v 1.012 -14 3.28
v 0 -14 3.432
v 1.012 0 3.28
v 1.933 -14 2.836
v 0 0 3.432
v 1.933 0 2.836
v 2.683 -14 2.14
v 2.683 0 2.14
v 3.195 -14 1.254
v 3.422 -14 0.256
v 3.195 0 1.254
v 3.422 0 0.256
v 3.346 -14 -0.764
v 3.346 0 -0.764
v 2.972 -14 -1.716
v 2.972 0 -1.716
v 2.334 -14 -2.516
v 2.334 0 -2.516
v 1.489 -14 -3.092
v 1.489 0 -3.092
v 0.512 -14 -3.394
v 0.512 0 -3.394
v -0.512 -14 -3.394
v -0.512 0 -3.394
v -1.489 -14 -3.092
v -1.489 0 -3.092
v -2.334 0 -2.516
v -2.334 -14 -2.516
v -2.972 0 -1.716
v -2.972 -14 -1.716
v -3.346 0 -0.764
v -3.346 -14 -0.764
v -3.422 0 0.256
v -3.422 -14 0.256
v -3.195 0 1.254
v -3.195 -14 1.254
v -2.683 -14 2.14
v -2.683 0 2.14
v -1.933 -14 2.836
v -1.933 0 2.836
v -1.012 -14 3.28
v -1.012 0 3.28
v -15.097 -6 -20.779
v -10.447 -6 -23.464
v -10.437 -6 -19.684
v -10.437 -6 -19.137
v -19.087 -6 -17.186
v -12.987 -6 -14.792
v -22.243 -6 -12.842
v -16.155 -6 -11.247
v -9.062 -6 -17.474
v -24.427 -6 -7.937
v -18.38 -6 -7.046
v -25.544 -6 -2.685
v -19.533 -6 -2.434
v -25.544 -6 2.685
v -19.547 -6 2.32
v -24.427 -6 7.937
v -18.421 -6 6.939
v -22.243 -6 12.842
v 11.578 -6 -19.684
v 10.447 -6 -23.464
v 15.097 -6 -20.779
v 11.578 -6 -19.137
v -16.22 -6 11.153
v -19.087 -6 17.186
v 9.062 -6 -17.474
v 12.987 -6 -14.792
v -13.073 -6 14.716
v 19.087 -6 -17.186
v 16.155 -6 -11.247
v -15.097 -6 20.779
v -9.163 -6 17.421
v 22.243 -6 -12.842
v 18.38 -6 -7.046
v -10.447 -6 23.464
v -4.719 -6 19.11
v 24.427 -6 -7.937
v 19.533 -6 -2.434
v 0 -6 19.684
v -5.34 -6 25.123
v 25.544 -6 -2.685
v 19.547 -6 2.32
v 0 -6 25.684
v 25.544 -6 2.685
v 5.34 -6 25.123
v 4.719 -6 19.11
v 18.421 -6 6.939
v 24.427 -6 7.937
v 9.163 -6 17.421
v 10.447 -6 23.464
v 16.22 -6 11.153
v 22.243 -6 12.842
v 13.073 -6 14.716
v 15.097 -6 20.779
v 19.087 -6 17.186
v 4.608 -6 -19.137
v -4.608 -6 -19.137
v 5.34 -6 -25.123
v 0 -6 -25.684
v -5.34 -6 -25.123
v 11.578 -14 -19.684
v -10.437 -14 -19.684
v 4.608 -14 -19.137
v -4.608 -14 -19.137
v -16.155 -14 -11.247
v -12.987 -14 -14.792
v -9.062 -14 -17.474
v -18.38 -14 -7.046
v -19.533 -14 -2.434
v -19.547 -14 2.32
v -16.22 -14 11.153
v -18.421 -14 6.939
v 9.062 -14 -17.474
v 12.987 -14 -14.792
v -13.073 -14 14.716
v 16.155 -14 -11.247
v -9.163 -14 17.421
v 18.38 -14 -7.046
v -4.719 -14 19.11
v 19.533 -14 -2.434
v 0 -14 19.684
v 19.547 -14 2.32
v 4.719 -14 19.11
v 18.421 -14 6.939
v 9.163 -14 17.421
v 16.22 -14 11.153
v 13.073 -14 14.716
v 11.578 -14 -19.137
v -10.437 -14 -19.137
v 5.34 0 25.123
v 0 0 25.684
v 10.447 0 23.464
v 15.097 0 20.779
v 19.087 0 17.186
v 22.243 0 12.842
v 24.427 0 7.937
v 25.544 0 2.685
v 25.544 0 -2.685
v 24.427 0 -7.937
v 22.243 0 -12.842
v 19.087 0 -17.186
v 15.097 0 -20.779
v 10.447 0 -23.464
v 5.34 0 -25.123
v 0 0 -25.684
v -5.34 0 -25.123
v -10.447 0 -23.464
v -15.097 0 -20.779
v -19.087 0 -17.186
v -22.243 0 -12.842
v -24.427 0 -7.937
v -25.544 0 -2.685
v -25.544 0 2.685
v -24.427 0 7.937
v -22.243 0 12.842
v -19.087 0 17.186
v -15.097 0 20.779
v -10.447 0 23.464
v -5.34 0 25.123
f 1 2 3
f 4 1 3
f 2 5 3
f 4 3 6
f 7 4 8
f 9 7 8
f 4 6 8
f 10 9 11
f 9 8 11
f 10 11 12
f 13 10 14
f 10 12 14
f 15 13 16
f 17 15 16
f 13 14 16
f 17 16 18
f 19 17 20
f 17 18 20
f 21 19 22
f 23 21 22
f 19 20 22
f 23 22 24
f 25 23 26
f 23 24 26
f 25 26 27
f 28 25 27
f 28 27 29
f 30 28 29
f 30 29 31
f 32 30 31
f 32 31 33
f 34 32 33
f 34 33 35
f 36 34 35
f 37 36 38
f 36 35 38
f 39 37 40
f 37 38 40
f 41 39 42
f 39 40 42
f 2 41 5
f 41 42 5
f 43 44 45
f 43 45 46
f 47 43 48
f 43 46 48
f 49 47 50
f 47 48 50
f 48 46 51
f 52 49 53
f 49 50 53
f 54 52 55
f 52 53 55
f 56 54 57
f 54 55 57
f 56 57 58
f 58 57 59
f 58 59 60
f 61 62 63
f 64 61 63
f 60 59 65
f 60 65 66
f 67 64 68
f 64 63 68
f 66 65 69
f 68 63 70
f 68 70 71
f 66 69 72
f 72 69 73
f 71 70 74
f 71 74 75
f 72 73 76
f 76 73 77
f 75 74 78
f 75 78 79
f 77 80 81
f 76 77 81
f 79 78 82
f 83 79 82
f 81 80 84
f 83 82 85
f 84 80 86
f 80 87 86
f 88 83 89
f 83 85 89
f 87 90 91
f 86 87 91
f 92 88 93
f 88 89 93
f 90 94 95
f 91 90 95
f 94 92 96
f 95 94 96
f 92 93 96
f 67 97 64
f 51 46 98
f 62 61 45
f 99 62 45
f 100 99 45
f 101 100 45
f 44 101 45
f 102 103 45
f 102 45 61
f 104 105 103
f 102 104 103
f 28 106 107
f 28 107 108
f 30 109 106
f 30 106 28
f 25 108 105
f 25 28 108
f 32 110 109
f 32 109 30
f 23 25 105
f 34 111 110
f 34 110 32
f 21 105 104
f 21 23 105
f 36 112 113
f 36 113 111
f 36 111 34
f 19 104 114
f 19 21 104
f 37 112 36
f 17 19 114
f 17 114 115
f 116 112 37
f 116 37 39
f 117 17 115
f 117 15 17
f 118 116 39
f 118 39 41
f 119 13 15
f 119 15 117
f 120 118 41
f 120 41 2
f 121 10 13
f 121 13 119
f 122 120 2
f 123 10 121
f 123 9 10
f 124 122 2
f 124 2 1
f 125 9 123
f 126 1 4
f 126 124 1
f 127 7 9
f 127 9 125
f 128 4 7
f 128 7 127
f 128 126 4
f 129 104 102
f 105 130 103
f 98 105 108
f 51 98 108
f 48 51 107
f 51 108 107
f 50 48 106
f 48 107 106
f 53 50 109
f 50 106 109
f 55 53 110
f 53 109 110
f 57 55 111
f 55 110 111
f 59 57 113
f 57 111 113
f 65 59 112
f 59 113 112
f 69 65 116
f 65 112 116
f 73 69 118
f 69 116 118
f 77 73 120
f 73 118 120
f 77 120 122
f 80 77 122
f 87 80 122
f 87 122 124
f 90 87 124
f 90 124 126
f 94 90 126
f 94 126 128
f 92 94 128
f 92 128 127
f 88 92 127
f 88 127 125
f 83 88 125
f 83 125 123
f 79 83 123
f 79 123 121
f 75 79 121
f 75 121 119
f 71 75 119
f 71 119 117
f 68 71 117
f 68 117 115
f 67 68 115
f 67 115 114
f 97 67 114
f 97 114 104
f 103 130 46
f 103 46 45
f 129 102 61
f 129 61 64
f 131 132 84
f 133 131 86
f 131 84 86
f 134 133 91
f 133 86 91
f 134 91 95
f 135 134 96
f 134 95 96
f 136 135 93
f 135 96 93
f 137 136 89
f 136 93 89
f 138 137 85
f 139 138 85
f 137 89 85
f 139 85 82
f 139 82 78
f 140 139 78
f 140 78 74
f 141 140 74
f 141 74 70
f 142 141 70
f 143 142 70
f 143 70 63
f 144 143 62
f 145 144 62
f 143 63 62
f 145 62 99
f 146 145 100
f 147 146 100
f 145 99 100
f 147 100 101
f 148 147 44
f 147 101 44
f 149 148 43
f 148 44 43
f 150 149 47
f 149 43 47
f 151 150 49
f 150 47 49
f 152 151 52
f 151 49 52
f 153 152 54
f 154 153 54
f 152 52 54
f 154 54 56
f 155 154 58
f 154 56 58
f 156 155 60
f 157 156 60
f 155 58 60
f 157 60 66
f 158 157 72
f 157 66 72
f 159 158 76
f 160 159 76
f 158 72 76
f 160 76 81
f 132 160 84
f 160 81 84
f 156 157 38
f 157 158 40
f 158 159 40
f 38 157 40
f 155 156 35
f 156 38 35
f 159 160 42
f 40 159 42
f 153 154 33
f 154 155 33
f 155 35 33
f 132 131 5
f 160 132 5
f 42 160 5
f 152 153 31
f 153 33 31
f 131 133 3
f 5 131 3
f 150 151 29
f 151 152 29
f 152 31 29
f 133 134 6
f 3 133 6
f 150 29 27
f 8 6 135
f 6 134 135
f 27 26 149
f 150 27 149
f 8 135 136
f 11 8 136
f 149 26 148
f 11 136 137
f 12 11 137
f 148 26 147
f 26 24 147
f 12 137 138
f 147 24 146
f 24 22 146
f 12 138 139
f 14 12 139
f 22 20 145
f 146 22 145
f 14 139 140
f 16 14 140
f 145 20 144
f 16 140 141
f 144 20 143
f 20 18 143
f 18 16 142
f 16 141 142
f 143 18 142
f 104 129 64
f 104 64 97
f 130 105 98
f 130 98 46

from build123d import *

# Parameters (mm, degrees)
F3_DEPTH = 10


with BuildPart() as f1:
    # F0 (on Right) → F1 (revolve)
    with BuildSketch(Plane.YZ):
        Polygon((-14, 3.431979), (0, 3.431979), (0, 25.684212), (-6, 25.684212), (-6, 19.684212), (-14, 19.684212), align=None)
    revolve(axis=Axis((0, -7, 0), (0, 1, 0)))

    # F2 (on face) → F3 (join)
    with BuildSketch(Plane.XZ.offset(14)):
        Polygon((-10.437276, -19.684212), (0, -19.684212), (11.577706, -19.684212), (11.577706, -19.137302), (-10.437276, -19.137302), align=None)
    extrude(amount=-F3_DEPTH)


solid = f1.part
